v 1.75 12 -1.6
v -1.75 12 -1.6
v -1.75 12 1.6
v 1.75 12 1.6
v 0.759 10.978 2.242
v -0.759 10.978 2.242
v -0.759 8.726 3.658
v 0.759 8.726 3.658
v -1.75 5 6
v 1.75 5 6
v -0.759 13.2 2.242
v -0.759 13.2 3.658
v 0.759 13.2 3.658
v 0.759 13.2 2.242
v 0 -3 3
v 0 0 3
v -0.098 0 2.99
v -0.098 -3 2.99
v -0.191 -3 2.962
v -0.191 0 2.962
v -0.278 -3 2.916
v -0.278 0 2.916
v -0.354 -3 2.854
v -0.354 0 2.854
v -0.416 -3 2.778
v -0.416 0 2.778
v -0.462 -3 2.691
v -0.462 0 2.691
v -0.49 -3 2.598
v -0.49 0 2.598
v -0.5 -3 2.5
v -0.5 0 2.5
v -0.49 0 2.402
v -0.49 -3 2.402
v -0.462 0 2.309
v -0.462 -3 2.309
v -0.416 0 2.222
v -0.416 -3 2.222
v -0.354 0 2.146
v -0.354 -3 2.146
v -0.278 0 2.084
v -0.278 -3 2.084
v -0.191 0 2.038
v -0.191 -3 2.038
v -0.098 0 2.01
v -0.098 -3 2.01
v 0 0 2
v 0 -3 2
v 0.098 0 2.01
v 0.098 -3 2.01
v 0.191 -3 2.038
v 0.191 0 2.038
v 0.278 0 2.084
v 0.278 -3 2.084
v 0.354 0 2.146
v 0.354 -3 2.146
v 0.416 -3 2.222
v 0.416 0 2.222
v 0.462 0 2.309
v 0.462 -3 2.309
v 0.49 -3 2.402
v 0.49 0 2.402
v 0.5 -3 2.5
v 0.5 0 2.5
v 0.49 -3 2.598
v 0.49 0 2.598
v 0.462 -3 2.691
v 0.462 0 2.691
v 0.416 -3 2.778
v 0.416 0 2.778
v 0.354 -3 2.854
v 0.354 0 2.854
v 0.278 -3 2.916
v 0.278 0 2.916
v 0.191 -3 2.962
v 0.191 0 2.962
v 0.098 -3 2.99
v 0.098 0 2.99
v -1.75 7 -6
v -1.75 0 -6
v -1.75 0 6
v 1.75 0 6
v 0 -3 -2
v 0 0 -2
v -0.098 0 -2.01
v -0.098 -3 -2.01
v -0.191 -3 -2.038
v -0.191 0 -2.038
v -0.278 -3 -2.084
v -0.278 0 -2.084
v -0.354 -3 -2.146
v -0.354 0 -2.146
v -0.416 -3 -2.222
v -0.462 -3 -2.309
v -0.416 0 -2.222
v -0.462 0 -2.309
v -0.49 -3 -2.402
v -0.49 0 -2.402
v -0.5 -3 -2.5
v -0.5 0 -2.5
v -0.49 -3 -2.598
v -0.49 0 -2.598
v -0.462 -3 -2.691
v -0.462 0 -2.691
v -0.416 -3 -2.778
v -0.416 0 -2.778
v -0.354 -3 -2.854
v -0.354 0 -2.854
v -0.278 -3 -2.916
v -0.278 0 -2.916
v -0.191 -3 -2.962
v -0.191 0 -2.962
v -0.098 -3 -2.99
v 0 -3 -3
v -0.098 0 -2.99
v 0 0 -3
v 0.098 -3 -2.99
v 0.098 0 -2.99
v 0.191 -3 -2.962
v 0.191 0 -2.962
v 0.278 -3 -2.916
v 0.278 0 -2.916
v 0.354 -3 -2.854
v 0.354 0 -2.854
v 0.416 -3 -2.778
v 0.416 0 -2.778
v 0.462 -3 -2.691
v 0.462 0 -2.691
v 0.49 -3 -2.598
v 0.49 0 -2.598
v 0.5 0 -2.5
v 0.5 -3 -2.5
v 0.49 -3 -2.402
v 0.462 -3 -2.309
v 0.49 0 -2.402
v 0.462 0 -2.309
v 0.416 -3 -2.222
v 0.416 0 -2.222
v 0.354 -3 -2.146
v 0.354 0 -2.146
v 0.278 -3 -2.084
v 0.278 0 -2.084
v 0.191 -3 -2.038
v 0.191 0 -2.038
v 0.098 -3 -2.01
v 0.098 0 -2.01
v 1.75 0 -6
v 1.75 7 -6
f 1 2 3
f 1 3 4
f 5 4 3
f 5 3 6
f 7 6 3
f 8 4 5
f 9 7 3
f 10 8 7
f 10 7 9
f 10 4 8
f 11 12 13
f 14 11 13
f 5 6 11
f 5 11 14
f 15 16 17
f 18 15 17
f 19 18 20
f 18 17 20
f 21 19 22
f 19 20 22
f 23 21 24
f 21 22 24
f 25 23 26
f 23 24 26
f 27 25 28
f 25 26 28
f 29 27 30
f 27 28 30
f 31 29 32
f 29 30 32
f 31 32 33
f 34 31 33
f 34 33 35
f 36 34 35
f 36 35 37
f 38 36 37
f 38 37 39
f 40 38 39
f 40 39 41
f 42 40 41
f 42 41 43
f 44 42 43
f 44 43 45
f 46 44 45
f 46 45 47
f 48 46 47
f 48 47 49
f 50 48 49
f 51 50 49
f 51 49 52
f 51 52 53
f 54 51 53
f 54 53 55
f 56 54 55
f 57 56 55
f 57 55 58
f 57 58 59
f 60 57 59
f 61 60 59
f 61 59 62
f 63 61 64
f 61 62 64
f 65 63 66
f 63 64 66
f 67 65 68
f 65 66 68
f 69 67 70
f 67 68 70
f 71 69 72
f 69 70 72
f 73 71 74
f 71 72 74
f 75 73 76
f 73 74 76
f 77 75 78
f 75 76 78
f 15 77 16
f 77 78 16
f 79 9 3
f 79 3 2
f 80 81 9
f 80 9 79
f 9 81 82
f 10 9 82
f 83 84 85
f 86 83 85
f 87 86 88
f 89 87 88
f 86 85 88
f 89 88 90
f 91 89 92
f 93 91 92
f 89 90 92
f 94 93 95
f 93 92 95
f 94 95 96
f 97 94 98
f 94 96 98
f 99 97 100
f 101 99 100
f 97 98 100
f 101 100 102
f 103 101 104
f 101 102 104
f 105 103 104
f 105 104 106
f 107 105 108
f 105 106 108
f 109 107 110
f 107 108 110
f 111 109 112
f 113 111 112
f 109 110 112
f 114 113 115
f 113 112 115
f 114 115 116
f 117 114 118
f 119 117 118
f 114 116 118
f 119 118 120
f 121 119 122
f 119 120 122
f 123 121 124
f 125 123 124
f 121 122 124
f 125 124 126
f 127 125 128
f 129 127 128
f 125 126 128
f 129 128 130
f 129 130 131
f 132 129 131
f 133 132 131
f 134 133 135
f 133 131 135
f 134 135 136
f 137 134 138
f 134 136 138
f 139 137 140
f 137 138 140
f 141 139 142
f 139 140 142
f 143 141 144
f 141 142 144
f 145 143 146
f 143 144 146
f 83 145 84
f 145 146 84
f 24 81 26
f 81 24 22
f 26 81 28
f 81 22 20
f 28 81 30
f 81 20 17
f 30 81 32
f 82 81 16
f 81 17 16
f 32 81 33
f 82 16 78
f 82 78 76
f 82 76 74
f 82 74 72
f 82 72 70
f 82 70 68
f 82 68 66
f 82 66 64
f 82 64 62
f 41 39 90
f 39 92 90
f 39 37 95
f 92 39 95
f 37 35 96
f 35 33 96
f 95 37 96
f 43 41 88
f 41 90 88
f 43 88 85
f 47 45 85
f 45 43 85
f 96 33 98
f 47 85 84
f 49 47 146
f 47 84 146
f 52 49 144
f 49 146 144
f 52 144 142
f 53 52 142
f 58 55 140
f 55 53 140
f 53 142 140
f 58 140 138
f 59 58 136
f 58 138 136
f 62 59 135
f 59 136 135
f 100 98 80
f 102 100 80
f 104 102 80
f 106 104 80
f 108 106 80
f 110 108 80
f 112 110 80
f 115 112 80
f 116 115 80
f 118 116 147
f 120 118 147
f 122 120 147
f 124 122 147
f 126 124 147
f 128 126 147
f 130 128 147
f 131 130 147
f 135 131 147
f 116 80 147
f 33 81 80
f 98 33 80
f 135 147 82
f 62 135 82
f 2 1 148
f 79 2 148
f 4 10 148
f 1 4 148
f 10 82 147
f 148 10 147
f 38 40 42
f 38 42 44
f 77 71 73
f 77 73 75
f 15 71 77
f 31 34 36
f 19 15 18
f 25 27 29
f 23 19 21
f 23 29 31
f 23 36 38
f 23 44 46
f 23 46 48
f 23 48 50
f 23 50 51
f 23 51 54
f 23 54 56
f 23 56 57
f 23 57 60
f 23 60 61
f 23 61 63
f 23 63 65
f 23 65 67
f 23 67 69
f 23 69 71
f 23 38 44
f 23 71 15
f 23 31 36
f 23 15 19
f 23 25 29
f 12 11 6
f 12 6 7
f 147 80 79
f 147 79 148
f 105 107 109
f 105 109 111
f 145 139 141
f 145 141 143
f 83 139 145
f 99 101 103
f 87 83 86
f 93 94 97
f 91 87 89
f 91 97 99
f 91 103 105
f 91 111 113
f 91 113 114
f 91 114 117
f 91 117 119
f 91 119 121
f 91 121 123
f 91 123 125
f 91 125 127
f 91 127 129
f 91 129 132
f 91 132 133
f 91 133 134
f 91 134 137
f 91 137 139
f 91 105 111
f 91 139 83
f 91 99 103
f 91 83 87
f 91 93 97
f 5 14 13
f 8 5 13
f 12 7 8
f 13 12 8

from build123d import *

# Parameters (mm, degrees)
SKETCH_1_W          = 3.5
SKETCH_1_H          = 12
EXTRUDE_1_DEPTH     = 12
SKETCH_2_R          = 0.5
EXTRUDE_2_DEPTH     = 3
CUT_EXTRUDE_1_DEPTH = 5
SKETCH_4_W          = 1.517225246
SKETCH_4_H          = 1.416076897
EXTRUDE_1_2_DEPTH   = 13.2


with BuildPart() as part:
    # 草图1 → Extrude 1 (new body)
    with BuildSketch(Plane(origin=(0, 0, 0), x_dir=(1, 0, 0), z_dir=(0, 1, 0))):
        Rectangle(SKETCH_1_W, SKETCH_1_H)
    extrude(amount=EXTRUDE_1_DEPTH)

    # 草图2 → 拉伸2 (add)
    with BuildSketch(Plane.XZ):
        with Locations(Location((0, 2.5, 0), (0, 0, 90))):
            Circle(SKETCH_2_R)
        with Locations(Location((0, -2.5, 0), (0, 0, 90))):
            Circle(SKETCH_2_R)
    extrude(amount=EXTRUDE_2_DEPTH)

    # 草图3 → 切除-拉伸1 (cut)
    with BuildSketch(Plane(origin=(1.75, 0, 0), x_dir=(0, 0, -1), z_dir=(1, 0, 0))):
        Polygon((-1.6, 12), (-6, 5), (-6, 12), align=None)
        Polygon((1.6, 12), (6, 7), (6, 12), align=None)
    extrude(amount=-CUT_EXTRUDE_1_DEPTH, mode=Mode.SUBTRACT)

    # 草图4 → Extrude 1 2 (add)
    with BuildSketch(Plane.XZ):
        with Locations((0, 2.950160203)):
            Rectangle(SKETCH_4_W, SKETCH_4_H)
    extrude(amount=-EXTRUDE_1_2_DEPTH)


solid = part.part
